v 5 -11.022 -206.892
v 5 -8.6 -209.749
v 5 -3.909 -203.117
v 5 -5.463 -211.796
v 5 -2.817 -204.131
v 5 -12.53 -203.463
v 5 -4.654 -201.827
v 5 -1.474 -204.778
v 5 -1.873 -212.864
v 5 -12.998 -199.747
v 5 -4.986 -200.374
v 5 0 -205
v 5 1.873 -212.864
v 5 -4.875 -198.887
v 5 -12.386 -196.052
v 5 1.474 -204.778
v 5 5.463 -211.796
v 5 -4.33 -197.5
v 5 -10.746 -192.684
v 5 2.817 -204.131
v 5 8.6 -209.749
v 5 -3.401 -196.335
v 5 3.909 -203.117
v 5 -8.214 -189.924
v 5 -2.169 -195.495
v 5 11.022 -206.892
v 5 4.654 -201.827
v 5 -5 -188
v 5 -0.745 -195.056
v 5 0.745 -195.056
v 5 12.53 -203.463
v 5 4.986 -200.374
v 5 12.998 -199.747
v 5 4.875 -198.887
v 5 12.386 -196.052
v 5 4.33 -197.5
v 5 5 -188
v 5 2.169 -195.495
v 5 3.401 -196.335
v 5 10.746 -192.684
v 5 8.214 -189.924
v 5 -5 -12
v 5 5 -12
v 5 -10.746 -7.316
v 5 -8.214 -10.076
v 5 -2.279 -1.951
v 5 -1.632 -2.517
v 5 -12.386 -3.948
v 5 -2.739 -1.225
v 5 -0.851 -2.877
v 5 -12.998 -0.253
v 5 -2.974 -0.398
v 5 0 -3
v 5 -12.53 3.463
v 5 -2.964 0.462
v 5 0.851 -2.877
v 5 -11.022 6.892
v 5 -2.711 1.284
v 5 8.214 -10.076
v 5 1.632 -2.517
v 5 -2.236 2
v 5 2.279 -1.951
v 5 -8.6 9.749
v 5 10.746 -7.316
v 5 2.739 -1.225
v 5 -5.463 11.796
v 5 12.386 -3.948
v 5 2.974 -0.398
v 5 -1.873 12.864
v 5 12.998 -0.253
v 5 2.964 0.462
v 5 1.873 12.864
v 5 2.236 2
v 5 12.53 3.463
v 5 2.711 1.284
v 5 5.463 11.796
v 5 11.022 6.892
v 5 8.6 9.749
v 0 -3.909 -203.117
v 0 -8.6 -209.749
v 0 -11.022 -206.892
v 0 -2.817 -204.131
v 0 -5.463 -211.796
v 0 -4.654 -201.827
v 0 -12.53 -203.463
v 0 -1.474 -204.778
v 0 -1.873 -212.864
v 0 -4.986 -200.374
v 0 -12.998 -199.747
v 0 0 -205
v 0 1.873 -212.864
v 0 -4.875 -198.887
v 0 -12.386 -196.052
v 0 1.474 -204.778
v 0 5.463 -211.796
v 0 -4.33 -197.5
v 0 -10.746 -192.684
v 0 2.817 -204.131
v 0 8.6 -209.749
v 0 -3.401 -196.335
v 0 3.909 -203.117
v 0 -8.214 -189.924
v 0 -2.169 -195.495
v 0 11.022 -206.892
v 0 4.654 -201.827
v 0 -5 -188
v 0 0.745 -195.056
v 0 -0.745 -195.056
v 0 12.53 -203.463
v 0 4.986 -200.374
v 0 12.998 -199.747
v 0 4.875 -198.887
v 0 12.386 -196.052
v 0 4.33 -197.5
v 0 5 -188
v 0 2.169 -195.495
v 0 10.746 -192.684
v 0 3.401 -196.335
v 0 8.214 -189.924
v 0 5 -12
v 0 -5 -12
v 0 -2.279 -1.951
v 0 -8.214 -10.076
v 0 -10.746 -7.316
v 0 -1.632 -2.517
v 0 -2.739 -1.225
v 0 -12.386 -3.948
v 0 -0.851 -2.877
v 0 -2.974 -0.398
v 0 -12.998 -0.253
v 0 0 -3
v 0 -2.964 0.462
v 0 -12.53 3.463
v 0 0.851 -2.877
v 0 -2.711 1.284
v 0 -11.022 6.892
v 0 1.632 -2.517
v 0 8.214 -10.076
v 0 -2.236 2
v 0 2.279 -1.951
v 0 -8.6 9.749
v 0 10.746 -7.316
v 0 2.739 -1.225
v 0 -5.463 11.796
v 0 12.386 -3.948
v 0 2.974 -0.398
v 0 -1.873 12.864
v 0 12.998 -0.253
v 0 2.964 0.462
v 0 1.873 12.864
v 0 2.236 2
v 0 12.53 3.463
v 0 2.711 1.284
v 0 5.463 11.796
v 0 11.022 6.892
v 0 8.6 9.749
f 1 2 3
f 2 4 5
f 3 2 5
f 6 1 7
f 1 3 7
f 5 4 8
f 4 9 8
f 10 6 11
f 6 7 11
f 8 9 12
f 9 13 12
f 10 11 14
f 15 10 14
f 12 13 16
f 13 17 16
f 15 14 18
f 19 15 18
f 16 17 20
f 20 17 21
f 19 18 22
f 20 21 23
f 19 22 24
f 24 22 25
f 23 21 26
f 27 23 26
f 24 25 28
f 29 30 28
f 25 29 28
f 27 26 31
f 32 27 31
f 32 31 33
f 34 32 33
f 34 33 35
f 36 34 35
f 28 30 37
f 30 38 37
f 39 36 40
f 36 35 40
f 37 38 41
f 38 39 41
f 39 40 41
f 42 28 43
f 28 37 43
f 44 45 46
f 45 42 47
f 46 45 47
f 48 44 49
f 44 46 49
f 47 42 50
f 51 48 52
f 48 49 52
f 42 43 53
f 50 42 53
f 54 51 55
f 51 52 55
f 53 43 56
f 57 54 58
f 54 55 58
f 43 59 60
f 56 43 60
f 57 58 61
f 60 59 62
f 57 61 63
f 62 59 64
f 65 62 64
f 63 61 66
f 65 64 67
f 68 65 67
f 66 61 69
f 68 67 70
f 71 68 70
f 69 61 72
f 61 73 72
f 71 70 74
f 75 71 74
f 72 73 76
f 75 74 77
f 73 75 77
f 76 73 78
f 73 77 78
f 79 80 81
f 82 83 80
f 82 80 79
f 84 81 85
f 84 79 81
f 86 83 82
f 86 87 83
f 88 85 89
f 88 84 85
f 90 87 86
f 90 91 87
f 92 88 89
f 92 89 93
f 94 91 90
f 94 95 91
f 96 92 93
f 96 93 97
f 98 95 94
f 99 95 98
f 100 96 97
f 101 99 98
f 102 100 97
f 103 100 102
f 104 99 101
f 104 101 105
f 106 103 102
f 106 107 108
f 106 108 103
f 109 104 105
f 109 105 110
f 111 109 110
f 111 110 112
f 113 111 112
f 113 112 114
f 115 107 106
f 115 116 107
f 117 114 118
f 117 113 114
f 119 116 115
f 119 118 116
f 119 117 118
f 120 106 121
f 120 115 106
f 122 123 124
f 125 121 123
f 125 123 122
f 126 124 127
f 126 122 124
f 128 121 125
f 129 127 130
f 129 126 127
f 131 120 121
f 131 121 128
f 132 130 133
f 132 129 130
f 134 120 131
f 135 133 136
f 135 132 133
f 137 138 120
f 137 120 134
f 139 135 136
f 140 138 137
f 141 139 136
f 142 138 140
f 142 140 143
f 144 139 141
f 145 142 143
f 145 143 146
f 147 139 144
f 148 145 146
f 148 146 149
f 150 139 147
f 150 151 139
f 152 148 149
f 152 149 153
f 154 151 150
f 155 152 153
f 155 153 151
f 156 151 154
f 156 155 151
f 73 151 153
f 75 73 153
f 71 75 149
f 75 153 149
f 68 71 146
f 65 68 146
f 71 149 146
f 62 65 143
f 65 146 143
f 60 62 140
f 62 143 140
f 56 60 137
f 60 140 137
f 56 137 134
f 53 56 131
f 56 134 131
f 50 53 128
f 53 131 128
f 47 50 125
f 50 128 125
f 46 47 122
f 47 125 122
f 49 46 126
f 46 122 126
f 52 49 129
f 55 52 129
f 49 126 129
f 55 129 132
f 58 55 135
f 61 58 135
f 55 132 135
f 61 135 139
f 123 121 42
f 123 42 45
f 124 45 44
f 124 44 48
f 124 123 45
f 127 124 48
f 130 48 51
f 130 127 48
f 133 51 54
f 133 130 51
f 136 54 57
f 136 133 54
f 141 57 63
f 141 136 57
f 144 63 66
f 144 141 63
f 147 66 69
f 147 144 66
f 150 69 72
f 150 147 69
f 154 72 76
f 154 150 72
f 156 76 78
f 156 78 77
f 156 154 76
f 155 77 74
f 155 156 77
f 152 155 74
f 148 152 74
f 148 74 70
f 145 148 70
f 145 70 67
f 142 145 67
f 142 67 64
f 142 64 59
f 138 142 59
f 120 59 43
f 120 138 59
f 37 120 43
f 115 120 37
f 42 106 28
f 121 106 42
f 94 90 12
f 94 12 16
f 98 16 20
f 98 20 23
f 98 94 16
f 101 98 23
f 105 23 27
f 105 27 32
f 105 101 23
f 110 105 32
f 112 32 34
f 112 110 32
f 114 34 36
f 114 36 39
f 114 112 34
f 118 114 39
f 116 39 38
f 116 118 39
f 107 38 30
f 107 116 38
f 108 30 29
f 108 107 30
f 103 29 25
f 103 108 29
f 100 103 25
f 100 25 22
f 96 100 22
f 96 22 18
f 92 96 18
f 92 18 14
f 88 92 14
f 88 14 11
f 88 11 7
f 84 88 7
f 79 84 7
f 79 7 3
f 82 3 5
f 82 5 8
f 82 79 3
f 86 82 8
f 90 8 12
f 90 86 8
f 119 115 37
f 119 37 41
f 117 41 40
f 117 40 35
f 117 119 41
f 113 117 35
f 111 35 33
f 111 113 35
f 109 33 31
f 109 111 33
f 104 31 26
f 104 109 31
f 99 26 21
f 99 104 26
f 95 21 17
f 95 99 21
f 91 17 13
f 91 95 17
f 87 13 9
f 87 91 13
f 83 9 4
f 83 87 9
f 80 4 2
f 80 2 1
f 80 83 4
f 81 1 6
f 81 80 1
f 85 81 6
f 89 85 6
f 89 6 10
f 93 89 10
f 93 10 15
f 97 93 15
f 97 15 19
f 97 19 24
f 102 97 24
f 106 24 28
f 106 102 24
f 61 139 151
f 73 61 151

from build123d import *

# Parameters (mm, degrees)
CROQUIS1_R              = 5
SALIENTE_EXTRUIR1_DEPTH = 5


with BuildPart() as part:
    # Croquis1 → Saliente-Extruir1 (new body)
    with BuildSketch(Plane(origin=(0, 0, 0), x_dir=(0, 0, -1), z_dir=(1, 0, 0))):
        with BuildLine():
            Line((188, -5), (12, -5))
            ThreePointArc((12, -5), (-13, 0), (12, 5))
            Line((12, 5), (188, 5))
            ThreePointArc((188, 5), (213, 0), (188, -5))
        make_face()
        with Locations((200, 0)):
            Circle(CROQUIS1_R, mode=Mode.SUBTRACT)
        with BuildLine():
            Line((-2, 0), (-2, 2.236067977))
            ThreePointArc((-2, 2.236067977), (3, 0), (-2, -2.236067977))
            Line((-2, -2.236067977), (-2, 0))
        make_face(mode=Mode.SUBTRACT)
    extrude(amount=SALIENTE_EXTRUIR1_DEPTH)


solid = part.part
